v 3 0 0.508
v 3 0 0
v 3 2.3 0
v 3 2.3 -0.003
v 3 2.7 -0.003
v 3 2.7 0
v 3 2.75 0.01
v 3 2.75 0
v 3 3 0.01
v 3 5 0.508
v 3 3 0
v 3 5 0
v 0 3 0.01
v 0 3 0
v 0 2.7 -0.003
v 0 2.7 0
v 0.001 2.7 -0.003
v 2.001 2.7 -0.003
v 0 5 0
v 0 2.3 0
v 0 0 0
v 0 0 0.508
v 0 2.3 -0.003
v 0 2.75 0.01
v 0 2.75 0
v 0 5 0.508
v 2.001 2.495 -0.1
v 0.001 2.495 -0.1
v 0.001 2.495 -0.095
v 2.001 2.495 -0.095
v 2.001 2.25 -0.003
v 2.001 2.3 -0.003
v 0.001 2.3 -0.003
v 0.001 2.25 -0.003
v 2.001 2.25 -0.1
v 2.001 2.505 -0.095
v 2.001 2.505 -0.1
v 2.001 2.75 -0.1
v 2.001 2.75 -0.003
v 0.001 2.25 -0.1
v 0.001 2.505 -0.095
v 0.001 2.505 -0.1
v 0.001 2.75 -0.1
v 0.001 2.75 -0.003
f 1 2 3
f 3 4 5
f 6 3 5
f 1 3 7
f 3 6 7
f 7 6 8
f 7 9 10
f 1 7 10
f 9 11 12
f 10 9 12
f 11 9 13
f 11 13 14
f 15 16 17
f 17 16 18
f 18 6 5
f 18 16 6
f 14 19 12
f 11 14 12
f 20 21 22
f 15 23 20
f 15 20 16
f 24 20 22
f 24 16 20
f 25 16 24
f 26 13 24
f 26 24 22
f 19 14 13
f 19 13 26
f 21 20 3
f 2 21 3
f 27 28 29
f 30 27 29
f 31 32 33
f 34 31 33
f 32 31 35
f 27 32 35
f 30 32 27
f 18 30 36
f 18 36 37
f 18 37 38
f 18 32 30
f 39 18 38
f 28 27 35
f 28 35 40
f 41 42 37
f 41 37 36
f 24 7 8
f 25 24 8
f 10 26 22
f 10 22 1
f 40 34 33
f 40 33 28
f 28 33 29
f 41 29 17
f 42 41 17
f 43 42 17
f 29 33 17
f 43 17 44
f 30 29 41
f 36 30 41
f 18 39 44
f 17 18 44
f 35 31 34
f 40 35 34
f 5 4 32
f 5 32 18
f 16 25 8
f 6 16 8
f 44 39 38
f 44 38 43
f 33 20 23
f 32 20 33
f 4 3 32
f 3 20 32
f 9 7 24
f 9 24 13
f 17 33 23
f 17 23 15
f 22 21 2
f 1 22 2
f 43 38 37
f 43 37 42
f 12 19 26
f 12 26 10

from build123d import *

# Parameters (mm, degrees)
SKETCH1_W           = 3
SKETCH1_H           = 5
BASE_EXTRUDE_DEPTH  = 0.508
SKETCH2_W           = 0.01
SKETCH2_H           = 0.25
CUT_EXTRUDE1_DEPTH  = 4
SKETCH3_W           = 0.003
SKETCH3_H           = 0.4
BOSS_EXTRUDE2_DEPTH = 3
SKETCH16_W          = 2
SKETCH16_H          = 0.5
BOSS_EXTRUDE3_DEPTH = 0.097
SKETCH17_W          = 0.005
SKETCH17_H          = 0.01
CUT_EXTRUDE2_DEPTH  = 4


with BuildPart() as part:
    # Sketch1 → Base-Extrude (new body)
    with BuildSketch(Plane.XY):
        with Locations((1.5, 2.5)):
            Rectangle(SKETCH1_W, SKETCH1_H)
    extrude(amount=BASE_EXTRUDE_DEPTH)

    # Sketch2 → Cut-Extrude1 (cut, through all)
    with BuildSketch(Plane(origin=(3, 0, 0), x_dir=(0, 0, -1), z_dir=(1, 0, 0))):
        with Locations((-0.005, 2.875)):
            Rectangle(SKETCH2_W, SKETCH2_H)
    extrude(amount=-CUT_EXTRUDE1_DEPTH, mode=Mode.SUBTRACT)

    # Sketch3 → Boss-Extrude2 (add)
    with BuildSketch(Plane(origin=(3, 0, 0), x_dir=(0, 0, -1), z_dir=(1, 0, 0))):
        with Locations((0.0015, 2.5)):
            Rectangle(SKETCH3_W, SKETCH3_H)
    extrude(amount=-BOSS_EXTRUDE2_DEPTH)

    # Sketch16 → Boss-Extrude3 (add)
    with BuildSketch(Plane(origin=(0, 0, -0.003), x_dir=(-1, 0, 0), z_dir=(0, 0, -1))):
        with Locations((-1.001, 2.5)):
            Rectangle(SKETCH16_W, SKETCH16_H)
    extrude(amount=BOSS_EXTRUDE3_DEPTH)

    # Sketch17 → Cut-Extrude2 (cut, through all)
    with BuildSketch(Plane.ZY):
        with Locations((-0.0975, 2.5)):
            Rectangle(SKETCH17_W, SKETCH17_H)
    extrude(amount=-CUT_EXTRUDE2_DEPTH, mode=Mode.SUBTRACT)


solid = part.part
